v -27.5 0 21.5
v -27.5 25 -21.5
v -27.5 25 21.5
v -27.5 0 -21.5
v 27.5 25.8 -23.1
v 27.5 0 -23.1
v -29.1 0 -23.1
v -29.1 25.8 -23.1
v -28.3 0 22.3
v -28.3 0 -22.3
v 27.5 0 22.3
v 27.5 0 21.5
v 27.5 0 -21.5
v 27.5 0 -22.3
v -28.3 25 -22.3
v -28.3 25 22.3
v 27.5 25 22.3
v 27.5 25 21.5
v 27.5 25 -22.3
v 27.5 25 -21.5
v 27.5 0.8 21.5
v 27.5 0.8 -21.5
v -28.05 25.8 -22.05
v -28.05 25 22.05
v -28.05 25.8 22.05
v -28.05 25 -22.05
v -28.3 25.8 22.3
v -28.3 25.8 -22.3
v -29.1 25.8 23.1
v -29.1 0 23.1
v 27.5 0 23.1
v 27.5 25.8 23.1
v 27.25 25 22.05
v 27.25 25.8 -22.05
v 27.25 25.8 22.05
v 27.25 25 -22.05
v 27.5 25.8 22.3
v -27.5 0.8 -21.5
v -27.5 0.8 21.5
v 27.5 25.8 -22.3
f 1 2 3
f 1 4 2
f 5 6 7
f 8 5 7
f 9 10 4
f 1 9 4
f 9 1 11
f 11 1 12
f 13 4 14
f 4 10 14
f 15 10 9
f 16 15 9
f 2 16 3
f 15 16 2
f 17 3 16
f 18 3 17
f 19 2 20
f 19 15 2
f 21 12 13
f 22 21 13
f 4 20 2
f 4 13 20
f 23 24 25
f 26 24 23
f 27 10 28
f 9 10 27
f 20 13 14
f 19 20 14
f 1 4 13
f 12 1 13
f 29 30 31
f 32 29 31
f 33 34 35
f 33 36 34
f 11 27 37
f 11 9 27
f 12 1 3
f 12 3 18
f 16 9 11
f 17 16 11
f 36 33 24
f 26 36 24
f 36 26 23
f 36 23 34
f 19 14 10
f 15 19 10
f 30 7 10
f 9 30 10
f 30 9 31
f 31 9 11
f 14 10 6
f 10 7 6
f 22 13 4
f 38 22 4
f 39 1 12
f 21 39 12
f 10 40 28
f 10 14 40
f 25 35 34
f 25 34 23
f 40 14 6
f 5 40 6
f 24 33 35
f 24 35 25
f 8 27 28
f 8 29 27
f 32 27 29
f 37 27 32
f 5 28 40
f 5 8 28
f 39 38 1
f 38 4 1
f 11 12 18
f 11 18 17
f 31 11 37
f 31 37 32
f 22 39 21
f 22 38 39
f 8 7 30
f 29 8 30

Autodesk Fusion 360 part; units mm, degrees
sketch "Sketch1" plane through (0, 0, 0) normal (0, 1, 0) x (1, 0, 0) in component "Bottom"
  line L0 (27.5, 21.5) -> (-27.5, 21.5)
  line L1 (-27.5, 21.5) -> (-27.5, -21.5)
  line L2 (-27.5, -21.5) -> (27.5, -21.5)
  line L3 (27.5, -21.5) -> (27.5, 21.5)
  line L4 (27.5, 21.5) -> (-27.5, -21.5) construction
  line L5 (-27.5, 21.5) -> (27.5, -21.5) construction
  line L6 (-28.3, 22.3) -> (-28.3, -22.3)
  line L7 (-28.3, -22.3) -> (28.3, -22.3)
  line L8 (28.3, -22.3) -> (28.3, 22.3)
  line L9 (28.3, 22.3) -> (-28.3, 22.3)
  line L10 (-29.1, 23.1) -> (-29.1, -23.1)
  line L11 (-29.1, -23.1) -> (29.1, -23.1)
  line L12 (29.1, -23.1) -> (29.1, 23.1)
  line L13 (29.1, 23.1) -> (-29.1, 23.1)
  line L14 (27.5, 21.5) -> (27.5, 23.1)
  line L15 (27.5, -21.5) -> (27.5, -23.1)
  dimension "d1" = 55
  dimension "d2" = 43
  dimension "d8" = 0.8
  dimension "d9" = 1.6
extrude "Extrude2" add sketch "Sketch1" along normal blind 25 contours L0 L1 L2 L6 L7 L9 L14 L15 makes body 1 in component "Bottom"
extrude "Extrude1" add sketch "Sketch1" along normal blind 0.8 separate body contours L0 L1 L2 L3 makes body 2 in component "Bottom"
extrude "Extrude3" add sketch "Sketch1" along normal blind 25.8 separate body contours L6 L7 L9 L10 L11 L13 L14 L15 makes body 3 in component "Bottom"
sketch "Sketch2" plane through (0, 0, 0) normal (0, 1, 0) x (1, 0, 0) in component "Bottom"
sketch "Sketch2 (2)" plane through (0, 25, 0) normal (0, 1, 0) x (-1, 0, 0) in component "Top"
  line L0 (-27.5, -21.5) -> (-27.5, -22.3)
  line L1 (-27.5, -22.3) -> (28.3, -22.3)
  line L2 (28.3, -22.3) -> (28.3, 22.3)
  line L3 (28.3, 22.3) -> (-27.5, 22.3)
  line L4 (-27.5, 22.3) -> (-27.5, 21.5)
  line L5 (-27.5, 21.5) -> (27.5, 21.5)
  line L6 (27.5, 21.5) -> (27.5, -21.5)
  line L7 (27.5, -21.5) -> (-27.5, -21.5)
  line L8 (28.3, -22.3) -> (-27.5, -22.3)
  line L9 (-27.5, -22.3) -> (-27.5, 22.3)
  line L10 (-27.5, 22.3) -> (28.3, 22.3)
  line L11 (28.3, 22.3) -> (28.3, -22.3)
  line L12 (-27.25, 22.05) -> (28.05, 22.05)
  line L13 (28.05, 22.05) -> (28.05, -22.05)
  line L14 (28.05, -22.05) -> (-27.25, -22.05)
  line L15 (-27.25, -22.05) -> (-27.25, 22.05)
  dimension "d18" = 0.25
extrude "Extrude1'" add sketch "Sketch2 (2)" along normal blind 0.8 separate body contours L5 L6 L7 L15 | L5 L6 L7 L12 L13 L14 L15 makes body 4 in component "Top"
component "Top" placed x (1, 0, 0) y (0, 1, 0) z (0, 0, 1) at (0, 0, 0)
component "Bottom" placed x (1, 0, 0) y (0, 1, 0) z (0, 0, 1) at (0, 0, 0)
equation "d1 = Length"
equation "d2 = Width"
equation "Width = 43 mm"
equation "Length = 55 mm"
equation "Height = 80 mm"
equation "InnerWall = 0.8 mm"
equation "OuterWall = 0.8 mm"
equation "d8 = InnerWall"
equation "d9 = InnerWall + OuterWall"
equation "d10 = InnerWall"
equation "InnerWallHeight = 25 mm"
equation "OuterWallheight = 30 mm"
equation "d14 = InnerWallHeight"
equation "d16 = InnerWallHeight + InnerWall"
equation "d19 = InnerWall"
